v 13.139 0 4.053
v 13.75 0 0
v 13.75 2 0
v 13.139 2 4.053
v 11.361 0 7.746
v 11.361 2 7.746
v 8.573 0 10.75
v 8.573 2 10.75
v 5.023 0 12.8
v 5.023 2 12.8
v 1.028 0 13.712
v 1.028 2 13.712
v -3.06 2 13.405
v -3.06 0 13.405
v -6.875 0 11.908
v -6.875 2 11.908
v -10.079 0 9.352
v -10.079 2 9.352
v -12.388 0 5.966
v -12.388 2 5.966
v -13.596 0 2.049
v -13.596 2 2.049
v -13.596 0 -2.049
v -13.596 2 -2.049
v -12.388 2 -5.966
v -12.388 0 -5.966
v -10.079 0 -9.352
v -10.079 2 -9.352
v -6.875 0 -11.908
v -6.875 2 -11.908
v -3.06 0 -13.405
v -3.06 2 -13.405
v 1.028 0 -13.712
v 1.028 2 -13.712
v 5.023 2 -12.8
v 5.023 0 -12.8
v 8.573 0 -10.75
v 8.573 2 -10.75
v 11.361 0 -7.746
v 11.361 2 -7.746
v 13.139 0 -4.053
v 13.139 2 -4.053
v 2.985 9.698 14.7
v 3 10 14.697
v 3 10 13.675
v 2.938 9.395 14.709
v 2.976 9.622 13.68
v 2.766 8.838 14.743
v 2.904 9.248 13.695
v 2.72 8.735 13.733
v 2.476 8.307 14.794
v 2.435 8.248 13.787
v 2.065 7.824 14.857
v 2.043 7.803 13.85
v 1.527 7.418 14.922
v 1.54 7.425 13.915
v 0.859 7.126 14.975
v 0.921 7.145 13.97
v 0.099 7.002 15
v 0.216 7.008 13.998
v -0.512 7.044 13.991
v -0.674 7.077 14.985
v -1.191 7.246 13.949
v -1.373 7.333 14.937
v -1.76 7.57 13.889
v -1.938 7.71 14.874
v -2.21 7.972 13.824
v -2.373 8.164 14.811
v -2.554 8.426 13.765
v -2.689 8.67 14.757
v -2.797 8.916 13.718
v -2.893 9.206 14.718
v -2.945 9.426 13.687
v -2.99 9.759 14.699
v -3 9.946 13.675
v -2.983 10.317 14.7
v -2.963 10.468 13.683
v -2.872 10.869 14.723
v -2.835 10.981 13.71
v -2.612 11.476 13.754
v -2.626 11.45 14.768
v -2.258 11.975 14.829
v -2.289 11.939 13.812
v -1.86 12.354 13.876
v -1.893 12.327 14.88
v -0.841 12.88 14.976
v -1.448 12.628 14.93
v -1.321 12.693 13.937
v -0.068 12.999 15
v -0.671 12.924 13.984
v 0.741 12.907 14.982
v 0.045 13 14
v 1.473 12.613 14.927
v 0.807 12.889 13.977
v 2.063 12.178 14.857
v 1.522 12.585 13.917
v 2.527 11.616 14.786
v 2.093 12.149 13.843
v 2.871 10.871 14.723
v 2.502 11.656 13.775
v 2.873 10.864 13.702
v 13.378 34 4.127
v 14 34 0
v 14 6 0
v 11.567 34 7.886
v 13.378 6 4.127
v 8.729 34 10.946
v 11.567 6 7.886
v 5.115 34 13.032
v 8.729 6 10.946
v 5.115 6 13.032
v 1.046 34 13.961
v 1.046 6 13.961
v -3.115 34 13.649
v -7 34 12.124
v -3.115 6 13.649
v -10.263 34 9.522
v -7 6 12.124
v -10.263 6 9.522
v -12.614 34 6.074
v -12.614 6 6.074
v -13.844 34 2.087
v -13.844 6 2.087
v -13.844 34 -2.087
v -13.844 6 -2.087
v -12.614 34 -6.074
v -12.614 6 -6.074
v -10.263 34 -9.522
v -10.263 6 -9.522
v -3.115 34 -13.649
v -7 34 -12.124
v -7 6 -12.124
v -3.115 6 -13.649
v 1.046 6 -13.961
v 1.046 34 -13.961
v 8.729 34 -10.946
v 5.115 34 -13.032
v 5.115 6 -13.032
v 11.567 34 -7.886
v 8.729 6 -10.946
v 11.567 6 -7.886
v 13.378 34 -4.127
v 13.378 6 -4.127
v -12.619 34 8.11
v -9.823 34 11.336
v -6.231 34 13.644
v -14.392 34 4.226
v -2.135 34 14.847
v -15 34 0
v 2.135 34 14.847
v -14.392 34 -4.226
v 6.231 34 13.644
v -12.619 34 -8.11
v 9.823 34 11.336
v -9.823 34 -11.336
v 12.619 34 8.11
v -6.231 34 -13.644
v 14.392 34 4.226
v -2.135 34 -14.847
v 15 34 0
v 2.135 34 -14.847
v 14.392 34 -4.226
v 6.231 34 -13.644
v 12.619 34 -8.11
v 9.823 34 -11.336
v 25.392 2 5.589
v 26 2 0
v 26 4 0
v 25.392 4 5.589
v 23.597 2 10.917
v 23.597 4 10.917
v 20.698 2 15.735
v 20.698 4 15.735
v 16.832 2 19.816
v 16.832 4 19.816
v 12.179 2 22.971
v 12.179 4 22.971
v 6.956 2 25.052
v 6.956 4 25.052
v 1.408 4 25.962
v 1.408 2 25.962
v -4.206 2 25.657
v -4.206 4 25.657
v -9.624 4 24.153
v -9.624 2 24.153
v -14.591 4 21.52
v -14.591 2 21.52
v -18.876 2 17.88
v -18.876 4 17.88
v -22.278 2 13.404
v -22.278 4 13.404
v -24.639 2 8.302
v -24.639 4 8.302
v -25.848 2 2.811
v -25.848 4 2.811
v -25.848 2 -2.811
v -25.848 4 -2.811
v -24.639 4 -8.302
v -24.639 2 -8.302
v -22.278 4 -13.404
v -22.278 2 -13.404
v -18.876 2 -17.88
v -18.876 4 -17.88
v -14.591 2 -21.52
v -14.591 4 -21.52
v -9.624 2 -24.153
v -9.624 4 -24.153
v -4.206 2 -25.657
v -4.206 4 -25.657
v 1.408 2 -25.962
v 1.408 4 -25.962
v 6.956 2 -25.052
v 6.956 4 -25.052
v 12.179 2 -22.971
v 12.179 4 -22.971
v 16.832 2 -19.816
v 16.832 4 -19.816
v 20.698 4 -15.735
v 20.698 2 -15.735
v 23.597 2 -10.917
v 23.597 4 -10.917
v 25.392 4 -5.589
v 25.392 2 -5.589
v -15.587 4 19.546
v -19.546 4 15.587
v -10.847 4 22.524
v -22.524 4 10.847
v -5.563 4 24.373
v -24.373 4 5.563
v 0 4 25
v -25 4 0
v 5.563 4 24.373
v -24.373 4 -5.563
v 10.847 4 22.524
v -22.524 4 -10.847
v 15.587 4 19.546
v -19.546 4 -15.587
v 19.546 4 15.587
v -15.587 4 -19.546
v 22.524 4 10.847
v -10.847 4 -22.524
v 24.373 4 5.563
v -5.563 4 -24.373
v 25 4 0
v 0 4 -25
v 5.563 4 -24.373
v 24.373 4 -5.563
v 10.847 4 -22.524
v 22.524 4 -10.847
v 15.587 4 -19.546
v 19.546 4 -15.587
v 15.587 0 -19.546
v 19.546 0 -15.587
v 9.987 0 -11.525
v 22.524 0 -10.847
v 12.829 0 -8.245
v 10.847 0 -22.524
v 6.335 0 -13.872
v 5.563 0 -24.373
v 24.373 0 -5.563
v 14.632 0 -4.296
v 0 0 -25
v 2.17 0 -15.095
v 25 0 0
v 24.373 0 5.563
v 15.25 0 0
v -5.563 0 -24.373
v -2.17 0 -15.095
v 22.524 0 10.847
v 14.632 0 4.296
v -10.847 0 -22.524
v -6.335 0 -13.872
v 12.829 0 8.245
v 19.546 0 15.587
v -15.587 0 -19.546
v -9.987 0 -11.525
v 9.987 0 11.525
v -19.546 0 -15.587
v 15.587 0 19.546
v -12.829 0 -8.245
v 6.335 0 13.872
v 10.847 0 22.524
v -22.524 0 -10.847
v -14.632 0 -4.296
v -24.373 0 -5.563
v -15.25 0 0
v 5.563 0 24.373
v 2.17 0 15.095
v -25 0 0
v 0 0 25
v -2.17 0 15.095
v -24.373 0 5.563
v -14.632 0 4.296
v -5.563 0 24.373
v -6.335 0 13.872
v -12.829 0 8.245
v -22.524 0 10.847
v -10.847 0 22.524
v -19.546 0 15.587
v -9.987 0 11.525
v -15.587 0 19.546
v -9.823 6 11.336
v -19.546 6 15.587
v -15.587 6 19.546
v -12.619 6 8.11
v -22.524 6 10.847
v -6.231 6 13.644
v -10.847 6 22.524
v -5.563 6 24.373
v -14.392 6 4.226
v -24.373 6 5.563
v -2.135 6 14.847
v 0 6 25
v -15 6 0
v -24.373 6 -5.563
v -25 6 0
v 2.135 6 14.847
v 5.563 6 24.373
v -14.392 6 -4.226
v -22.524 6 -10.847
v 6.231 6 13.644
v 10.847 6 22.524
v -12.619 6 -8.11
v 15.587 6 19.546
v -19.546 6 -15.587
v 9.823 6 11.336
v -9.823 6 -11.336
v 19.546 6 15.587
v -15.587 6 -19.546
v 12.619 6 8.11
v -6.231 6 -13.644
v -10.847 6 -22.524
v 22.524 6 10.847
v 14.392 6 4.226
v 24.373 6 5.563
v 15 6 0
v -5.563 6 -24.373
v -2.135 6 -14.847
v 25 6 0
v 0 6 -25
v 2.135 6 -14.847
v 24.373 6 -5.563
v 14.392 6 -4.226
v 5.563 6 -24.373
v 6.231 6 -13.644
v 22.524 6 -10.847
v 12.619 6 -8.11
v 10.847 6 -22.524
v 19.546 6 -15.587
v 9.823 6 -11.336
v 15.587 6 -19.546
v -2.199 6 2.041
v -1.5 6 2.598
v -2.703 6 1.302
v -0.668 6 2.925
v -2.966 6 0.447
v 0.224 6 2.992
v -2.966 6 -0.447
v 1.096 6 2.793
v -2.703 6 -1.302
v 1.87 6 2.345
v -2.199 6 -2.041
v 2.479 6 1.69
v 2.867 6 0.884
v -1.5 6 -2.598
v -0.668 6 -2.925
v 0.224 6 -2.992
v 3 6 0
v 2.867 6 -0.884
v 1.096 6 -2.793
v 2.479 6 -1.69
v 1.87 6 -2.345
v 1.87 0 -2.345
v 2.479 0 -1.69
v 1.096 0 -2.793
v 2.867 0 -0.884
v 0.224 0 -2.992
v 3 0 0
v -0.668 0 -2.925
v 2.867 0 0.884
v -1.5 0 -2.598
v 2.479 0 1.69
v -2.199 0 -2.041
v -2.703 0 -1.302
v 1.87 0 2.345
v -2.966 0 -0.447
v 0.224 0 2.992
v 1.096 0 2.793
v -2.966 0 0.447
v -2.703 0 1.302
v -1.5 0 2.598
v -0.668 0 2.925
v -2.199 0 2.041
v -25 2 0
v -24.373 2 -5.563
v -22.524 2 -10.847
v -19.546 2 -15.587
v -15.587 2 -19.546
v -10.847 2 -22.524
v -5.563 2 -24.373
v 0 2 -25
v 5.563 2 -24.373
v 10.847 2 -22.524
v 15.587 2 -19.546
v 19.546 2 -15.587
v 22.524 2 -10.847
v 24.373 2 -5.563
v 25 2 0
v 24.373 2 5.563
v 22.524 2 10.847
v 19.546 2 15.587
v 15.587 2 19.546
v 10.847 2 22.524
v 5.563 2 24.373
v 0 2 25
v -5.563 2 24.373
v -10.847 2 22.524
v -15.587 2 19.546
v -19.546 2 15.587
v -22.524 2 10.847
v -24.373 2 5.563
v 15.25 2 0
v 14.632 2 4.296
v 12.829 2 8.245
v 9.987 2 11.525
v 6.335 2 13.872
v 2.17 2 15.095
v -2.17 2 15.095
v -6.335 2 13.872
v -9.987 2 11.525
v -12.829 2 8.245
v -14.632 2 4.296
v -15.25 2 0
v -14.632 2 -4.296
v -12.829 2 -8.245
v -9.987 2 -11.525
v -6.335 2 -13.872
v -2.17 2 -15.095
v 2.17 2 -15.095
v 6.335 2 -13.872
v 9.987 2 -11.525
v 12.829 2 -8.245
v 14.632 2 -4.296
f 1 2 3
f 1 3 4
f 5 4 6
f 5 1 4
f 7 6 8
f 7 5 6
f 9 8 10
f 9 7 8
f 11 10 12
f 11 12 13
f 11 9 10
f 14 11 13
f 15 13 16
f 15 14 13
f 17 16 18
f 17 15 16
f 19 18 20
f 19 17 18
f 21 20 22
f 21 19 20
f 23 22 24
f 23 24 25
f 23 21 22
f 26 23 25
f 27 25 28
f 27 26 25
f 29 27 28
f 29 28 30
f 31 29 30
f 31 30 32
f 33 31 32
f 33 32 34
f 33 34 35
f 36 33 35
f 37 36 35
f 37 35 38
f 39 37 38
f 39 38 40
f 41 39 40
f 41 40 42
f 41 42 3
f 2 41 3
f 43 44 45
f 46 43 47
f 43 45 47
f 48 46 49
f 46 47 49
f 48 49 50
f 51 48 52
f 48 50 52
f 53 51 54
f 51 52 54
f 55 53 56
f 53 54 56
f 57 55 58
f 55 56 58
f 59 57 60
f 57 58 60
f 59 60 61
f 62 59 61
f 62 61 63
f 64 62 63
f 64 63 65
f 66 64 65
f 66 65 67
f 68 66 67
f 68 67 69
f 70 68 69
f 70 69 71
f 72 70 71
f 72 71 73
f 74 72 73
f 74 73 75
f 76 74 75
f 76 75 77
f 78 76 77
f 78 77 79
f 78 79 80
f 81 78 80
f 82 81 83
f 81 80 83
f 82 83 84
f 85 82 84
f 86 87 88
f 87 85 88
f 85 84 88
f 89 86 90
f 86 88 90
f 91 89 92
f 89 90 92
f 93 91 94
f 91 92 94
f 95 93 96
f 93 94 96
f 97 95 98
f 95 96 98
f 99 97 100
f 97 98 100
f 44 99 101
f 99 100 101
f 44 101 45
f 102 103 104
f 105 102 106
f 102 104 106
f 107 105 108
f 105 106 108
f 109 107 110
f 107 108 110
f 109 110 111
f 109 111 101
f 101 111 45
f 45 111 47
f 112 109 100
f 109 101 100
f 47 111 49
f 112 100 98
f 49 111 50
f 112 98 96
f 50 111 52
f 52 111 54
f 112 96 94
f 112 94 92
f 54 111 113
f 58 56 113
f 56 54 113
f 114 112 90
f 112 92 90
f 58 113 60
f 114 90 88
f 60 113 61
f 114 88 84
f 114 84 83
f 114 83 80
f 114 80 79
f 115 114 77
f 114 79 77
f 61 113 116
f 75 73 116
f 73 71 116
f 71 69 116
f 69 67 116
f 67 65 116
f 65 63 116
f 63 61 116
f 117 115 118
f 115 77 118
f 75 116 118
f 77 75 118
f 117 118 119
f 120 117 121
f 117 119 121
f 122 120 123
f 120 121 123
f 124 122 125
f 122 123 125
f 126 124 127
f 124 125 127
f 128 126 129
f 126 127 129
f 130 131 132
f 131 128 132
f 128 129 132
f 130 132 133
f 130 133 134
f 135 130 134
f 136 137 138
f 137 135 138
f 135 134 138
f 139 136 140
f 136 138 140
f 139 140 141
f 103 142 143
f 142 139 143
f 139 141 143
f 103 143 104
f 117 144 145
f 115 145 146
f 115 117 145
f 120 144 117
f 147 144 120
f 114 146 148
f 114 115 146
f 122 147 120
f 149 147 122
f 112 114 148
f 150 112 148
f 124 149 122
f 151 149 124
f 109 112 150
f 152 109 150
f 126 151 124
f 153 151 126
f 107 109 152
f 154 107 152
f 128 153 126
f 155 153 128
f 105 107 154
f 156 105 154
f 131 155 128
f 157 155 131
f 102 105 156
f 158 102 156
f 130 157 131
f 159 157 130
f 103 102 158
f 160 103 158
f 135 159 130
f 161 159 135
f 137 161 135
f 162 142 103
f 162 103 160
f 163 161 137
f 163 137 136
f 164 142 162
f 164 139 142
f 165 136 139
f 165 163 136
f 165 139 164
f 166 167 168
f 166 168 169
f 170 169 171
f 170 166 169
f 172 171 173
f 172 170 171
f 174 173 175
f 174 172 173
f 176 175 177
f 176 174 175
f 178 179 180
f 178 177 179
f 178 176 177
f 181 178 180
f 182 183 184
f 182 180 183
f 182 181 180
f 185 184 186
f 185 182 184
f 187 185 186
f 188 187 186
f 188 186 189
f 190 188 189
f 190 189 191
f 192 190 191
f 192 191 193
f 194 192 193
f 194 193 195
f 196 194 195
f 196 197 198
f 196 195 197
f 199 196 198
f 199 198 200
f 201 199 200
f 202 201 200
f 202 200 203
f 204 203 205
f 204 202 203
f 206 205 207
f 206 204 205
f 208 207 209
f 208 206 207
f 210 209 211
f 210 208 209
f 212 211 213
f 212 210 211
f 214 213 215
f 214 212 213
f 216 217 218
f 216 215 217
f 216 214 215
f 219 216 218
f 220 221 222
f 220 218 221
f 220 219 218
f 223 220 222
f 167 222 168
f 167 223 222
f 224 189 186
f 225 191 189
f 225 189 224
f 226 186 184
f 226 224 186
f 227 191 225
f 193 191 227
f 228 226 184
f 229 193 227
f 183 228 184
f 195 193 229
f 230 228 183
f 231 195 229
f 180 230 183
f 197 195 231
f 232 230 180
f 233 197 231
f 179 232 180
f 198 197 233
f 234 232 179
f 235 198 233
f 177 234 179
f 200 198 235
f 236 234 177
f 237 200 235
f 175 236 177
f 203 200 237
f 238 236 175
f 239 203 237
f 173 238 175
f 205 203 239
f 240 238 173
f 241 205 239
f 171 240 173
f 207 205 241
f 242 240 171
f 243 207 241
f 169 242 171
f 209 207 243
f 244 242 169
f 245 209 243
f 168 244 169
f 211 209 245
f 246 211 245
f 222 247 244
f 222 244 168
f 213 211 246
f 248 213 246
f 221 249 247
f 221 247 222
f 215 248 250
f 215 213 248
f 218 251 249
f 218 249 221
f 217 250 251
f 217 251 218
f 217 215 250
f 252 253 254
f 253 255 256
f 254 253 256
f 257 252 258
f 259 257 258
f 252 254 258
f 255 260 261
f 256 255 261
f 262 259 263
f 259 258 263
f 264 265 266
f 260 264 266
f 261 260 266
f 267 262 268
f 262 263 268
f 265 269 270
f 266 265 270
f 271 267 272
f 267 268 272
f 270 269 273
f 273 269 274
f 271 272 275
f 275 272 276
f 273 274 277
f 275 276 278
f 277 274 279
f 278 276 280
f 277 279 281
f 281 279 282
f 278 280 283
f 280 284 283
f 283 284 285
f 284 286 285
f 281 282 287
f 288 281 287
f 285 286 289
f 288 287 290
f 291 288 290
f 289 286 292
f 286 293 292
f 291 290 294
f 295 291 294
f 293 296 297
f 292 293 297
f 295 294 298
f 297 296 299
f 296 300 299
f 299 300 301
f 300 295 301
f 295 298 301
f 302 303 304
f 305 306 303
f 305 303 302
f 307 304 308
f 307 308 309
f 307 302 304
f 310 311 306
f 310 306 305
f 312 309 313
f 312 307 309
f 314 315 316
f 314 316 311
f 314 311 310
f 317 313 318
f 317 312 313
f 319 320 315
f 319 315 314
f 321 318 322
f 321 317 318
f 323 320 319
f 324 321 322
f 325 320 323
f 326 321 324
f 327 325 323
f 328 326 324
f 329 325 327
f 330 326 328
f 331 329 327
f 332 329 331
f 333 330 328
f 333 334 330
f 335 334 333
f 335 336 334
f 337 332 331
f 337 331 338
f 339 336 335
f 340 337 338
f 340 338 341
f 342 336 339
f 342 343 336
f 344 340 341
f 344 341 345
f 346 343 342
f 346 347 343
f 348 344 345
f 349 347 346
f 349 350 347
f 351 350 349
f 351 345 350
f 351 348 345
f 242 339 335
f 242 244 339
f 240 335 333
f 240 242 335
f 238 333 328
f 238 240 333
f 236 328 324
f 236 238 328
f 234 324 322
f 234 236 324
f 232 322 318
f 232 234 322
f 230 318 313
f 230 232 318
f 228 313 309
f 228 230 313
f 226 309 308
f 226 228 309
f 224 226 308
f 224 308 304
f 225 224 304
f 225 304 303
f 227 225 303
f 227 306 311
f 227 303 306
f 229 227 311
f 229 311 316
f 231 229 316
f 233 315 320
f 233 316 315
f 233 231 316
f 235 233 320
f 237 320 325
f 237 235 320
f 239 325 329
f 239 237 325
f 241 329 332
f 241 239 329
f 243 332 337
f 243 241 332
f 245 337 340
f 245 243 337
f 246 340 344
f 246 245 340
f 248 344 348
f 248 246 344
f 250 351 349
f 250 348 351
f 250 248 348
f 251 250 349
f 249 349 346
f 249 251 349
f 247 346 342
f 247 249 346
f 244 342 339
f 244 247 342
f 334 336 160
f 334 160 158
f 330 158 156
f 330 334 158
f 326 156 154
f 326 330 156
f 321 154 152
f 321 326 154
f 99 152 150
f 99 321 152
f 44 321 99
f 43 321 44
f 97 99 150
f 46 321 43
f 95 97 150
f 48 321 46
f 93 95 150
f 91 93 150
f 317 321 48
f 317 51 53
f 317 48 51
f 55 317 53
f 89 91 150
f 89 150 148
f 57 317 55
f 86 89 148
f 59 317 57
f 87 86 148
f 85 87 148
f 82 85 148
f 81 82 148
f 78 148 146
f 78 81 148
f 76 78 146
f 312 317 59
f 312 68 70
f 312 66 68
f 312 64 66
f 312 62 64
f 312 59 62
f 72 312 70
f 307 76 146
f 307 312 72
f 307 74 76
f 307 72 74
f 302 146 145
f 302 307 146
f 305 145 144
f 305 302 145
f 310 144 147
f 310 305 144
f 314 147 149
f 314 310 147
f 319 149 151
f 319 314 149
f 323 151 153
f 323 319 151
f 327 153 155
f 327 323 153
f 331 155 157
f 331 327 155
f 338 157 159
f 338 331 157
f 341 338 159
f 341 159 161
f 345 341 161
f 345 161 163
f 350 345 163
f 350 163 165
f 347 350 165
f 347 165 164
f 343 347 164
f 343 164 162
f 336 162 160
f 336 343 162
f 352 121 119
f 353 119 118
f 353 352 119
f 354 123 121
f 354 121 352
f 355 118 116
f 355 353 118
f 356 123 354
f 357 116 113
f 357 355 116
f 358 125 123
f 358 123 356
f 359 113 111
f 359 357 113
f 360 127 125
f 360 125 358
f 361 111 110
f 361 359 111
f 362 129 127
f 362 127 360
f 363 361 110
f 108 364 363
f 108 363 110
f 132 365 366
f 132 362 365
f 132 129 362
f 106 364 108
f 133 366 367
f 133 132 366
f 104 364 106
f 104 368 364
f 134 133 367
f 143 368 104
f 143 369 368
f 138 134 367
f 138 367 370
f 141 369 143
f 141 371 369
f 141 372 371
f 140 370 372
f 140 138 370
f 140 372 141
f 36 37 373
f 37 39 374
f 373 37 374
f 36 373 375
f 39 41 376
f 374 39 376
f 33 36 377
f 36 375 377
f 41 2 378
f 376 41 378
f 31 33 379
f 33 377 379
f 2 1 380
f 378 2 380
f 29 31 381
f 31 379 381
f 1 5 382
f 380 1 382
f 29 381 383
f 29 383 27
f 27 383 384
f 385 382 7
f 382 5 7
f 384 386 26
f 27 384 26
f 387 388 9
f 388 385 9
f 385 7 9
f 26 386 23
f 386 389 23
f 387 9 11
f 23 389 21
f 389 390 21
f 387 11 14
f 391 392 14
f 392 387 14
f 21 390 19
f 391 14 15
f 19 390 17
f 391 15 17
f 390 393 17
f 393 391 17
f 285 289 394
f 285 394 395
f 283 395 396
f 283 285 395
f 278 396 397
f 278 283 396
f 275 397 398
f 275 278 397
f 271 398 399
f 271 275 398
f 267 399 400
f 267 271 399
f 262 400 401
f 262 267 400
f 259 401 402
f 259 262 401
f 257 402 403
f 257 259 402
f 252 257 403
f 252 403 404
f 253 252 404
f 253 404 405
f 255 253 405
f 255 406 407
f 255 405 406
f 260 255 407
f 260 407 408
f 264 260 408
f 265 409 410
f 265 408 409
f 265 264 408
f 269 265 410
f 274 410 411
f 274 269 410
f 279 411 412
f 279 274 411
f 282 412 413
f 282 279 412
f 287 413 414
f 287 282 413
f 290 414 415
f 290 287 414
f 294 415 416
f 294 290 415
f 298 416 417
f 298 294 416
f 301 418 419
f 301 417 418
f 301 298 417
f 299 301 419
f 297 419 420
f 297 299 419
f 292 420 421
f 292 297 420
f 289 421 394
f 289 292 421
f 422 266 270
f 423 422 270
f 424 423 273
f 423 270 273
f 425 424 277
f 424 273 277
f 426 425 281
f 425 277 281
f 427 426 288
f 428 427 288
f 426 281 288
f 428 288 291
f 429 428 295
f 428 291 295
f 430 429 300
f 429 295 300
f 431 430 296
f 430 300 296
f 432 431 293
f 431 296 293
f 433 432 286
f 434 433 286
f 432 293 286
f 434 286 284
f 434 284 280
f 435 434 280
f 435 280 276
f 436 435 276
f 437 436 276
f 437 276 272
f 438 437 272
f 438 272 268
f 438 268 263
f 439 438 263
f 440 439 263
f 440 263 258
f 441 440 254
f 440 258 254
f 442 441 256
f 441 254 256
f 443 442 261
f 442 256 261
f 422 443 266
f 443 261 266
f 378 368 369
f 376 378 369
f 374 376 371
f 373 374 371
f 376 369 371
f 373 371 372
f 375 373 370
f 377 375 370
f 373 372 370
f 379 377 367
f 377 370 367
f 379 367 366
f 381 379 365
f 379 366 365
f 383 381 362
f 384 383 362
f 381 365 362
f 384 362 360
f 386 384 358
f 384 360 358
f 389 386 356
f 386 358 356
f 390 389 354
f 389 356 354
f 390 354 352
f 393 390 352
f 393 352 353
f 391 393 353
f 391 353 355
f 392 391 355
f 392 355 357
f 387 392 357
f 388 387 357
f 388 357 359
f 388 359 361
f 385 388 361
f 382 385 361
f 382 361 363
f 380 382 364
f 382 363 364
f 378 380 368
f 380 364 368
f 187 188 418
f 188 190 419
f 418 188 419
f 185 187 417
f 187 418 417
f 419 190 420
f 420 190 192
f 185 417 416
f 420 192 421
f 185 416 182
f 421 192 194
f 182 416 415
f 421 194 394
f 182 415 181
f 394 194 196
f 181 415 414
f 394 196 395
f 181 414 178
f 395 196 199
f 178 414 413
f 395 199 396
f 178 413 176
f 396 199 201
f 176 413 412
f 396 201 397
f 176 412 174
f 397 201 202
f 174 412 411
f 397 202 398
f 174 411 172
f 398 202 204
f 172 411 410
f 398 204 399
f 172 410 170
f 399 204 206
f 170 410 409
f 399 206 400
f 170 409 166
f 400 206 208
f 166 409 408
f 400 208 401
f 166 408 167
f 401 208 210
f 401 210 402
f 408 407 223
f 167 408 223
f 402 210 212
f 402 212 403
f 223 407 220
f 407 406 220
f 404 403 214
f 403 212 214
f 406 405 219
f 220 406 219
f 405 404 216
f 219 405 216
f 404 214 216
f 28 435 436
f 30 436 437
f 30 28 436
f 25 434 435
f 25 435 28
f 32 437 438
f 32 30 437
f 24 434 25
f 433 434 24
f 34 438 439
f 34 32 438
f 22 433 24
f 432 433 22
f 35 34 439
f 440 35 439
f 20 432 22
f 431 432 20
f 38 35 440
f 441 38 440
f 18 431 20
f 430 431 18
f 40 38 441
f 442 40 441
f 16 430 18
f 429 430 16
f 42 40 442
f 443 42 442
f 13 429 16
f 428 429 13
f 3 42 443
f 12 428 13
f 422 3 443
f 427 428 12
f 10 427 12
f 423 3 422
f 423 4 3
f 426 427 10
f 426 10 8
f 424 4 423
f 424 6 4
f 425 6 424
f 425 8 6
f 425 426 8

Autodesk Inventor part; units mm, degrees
ref_plane "YZ Plane" through (0, 0, 0) normal (1, 0, 0) x (0, 1, 0)
ref_plane "XZ Plane" through (0, 0, 0) normal (0, 1, 0) x (-1, 0, 0)
ref_plane "XY Plane" through (0, 0, 0) normal (0, 0, 1) x (1, 0, 0)
sketch "Sketch1" plane through (0, 0, 0) normal (0, 1, 0) x (-1, 0, 0)
  circle A0 centre (0, 0) radius 25
  dimension "d0" = 50
extrude "Extrusion1" add sketch "Sketch1" along normal blind 2
sketch "Sketch2" plane through (0, 2, 0) normal (0, 1, 0) x (1, 0, 0)
  circle A0 centre (0, 0) radius 26
  dimension "d3" = 52
extrude "Extrusion2" add sketch "Sketch2" along normal blind 2
sketch "Sketch6" plane through (0, 4, 0) normal (0, 1, 0) x (1, 0, 0)
  circle A0 centre (0, 0) radius 25
  dimension "d17" = 50
extrude "Extrusion6" add sketch "Sketch6" along normal blind 2
sketch "Sketch3" plane through (0, 4, 0) normal (0, 1, 0) x (1, 0, 0)
  circle A0 centre (0, 0) radius 15
  circle A1 centre (0, 0) radius 14
  dimension "d6" = 30
  dimension "d7" = 28
extrude "Extrusion3" add sketch "Sketch3" along normal blind 30
sketch "Sketch5" plane through (0, 0, 0) normal (0, 0, 1) x (1, 0, 0)
  circle A0 centre (0, 10) radius 3
  line L0 (26, 4) -> (-26, 4) projected
  point P0 (0, 0)
  dimension "d13" = 6
  dimension "d14" = 6
extrude "Extrusion5" cut sketch "Sketch5" along normal blind 30
sketch "Sketch7" plane through (0, 6, 0) normal (0, 1, 0) x (1, 0, 0)
  circle A0 centre (0, 0) radius 3
  dimension "d20" = 6
extrude "Extrusion7" cut sketch "Sketch7" against normal through all
sketch "Sketch8" plane through (0, 0, 0) normal (0, -1, 0) x (1, 0, 0)
  circle A0 centre (0, 0) radius 3 projected
  circle A1 centre (0, 0) radius 13.75
  circle A2 centre (0, 0) radius 15.25
  dimension "d23" = 27.5
  dimension "d24" = 30.5
extrude "Extrusion8" cut sketch "Sketch8" against normal blind 2 contours A2
properties part number "Stack-lens holder"
